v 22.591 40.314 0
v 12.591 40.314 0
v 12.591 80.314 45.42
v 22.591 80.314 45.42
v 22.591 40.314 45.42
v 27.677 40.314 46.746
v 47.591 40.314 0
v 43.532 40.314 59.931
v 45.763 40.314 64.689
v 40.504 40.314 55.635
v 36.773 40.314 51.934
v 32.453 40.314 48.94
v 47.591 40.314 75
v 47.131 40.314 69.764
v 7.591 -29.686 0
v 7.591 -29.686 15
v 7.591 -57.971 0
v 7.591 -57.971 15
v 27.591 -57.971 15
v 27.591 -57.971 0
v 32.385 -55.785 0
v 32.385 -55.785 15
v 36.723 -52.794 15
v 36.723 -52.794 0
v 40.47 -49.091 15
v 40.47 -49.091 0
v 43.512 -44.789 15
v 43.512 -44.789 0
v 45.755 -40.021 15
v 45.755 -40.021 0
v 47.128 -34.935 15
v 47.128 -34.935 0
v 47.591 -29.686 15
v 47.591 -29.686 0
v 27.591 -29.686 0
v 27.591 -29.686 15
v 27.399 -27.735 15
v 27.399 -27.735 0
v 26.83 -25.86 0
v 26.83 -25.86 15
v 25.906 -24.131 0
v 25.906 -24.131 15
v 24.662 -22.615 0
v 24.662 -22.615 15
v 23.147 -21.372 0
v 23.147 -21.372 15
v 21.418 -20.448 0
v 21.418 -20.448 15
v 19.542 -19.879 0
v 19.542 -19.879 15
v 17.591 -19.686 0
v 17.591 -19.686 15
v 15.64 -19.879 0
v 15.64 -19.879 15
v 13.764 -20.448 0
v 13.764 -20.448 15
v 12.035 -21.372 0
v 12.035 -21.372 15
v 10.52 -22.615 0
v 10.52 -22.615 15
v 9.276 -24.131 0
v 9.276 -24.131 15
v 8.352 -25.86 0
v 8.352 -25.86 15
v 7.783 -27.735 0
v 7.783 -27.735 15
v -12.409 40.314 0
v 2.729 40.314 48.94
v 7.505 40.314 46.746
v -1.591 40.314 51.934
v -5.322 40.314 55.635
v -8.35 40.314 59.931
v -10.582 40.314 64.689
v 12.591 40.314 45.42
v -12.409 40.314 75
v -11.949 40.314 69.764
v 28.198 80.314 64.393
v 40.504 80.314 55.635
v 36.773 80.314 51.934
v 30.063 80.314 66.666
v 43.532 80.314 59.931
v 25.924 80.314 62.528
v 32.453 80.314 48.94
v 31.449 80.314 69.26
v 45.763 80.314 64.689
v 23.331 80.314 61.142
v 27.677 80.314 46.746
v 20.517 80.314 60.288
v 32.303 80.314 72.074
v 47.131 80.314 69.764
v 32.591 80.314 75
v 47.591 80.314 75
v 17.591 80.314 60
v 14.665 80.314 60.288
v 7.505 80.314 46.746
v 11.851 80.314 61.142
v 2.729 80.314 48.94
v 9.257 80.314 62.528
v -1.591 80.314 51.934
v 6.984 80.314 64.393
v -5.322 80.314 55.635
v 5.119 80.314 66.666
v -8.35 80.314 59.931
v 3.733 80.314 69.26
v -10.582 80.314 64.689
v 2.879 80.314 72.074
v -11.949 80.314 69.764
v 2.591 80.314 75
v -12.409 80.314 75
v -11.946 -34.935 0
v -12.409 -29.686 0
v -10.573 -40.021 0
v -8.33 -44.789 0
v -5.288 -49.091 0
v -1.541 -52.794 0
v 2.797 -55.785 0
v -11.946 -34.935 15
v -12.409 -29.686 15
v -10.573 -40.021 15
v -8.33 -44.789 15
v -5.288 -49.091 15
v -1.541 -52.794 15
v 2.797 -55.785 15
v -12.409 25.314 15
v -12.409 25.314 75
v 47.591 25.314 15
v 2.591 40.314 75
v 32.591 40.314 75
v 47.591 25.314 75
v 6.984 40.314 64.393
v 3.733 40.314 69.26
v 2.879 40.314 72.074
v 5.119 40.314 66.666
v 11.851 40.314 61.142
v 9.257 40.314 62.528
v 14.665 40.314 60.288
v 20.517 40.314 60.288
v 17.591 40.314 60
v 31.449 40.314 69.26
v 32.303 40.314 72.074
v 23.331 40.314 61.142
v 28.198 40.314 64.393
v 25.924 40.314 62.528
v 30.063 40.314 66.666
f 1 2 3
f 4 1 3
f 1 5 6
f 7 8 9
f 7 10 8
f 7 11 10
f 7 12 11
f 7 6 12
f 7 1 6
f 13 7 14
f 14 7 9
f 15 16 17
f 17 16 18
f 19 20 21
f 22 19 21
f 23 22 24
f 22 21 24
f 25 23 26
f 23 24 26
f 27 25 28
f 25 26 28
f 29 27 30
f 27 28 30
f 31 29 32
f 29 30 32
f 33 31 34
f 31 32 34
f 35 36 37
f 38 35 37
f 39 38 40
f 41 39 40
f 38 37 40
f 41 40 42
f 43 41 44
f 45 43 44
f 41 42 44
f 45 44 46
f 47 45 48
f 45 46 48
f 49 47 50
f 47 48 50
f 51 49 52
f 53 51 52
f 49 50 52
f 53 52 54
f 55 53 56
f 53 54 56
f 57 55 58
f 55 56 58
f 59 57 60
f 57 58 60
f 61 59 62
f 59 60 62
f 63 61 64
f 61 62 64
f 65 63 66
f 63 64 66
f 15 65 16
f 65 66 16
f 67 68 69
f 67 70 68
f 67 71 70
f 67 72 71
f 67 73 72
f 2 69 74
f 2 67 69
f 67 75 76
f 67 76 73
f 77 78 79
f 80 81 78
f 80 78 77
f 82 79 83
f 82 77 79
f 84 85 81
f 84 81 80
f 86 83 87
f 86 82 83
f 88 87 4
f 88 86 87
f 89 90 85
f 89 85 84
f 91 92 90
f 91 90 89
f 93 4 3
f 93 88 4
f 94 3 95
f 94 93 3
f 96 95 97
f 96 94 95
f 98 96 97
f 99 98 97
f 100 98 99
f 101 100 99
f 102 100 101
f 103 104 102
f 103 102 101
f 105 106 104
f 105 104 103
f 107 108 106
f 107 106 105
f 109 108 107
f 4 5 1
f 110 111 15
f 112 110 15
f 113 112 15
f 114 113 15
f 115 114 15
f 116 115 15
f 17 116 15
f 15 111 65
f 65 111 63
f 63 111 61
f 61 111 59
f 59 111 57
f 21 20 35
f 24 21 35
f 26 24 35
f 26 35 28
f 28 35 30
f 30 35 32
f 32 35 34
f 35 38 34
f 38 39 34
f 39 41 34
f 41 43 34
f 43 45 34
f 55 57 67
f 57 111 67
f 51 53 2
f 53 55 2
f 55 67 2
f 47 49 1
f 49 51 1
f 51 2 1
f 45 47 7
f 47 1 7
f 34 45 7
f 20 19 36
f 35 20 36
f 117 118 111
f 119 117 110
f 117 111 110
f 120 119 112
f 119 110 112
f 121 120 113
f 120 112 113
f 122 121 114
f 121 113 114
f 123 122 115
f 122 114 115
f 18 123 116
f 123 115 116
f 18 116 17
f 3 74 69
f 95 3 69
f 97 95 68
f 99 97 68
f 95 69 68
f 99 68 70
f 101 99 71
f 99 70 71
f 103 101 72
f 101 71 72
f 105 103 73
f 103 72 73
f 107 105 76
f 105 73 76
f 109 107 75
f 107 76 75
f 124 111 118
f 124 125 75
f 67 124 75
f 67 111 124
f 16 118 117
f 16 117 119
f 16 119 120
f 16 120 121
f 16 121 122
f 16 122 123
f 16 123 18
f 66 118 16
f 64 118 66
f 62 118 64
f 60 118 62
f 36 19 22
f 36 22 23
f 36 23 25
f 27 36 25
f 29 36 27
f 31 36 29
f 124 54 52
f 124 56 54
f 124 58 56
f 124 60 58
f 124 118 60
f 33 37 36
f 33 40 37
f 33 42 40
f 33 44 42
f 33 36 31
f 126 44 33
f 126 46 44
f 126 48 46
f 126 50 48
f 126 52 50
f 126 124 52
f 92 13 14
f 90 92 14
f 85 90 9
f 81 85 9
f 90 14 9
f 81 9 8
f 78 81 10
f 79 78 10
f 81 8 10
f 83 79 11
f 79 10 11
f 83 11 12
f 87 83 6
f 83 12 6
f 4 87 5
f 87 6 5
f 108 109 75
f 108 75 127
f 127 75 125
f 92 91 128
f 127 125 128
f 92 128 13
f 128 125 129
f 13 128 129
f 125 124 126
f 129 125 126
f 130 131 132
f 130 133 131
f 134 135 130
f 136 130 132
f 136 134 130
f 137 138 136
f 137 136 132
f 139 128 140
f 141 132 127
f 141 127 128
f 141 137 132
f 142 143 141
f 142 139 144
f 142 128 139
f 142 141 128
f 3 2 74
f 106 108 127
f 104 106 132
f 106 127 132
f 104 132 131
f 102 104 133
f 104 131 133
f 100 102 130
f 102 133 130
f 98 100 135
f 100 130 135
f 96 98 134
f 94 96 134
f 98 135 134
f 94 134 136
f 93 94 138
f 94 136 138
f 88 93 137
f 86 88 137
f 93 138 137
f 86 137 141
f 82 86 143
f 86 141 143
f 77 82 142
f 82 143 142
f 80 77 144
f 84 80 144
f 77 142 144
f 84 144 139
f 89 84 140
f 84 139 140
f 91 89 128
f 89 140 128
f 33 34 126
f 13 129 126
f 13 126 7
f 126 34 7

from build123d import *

# Parameters (mm, degrees)
F0_W      = 60
F0_H      = 15
F1_DEPTH  = 75
F2_DEPTH  = 15
F4_DEPTH  = 25
F6_DEPTH  = 40
F8_DEPTH  = 40
F10_DEPTH = 25


with BuildPart() as f1:
    # F0 (on Top) → F1 (new body)
    with BuildSketch(Plane.XY):
        with Locations((17.5909090042, 32.8136347234)):
            Rectangle(F0_W, F0_H)
    extrude(amount=F1_DEPTH)

    # F0 (on Top) → F2 (join)
    with BuildSketch(Plane.XY):
        with Locations((17.5909090042, 32.8136347234)):
            Rectangle(F0_W, F0_H)
        with BuildLine():
            Line((47.5909090042, 25.3136347234), (-12.4090909958, 25.3136347234))
            Line((-12.4090909958, 25.3136347234), (-12.4090909958, -29.6863652766))
            ThreePointArc((-12.4090909958, -29.6863652766), (17.5909090042, 0.3136347234), (47.5909090042, -29.6863652766))
            Line((47.5909090042, -29.6863652766), (47.5909090042, 25.3136347234))
        make_face()
        with BuildLine():
            ThreePointArc((47.5909090042, -29.6863652766), (17.5909090042, 0.3136347234), (-12.4090909958, -29.6863652766))
            Line((-12.4090909958, -29.6863652766), (47.5909090042, -29.6863652766))
        make_face()
        with BuildLine():
            Line((47.5909090042, -29.6863652766), (-12.4090909958, -29.6863652766))
            ThreePointArc((-12.4090909958, -29.6863652766), (17.5909090042, -59.6863652766), (47.5909090042, -29.6863652766))
        make_face()
    extrude(amount=F2_DEPTH)

    # F3 (on face) → F4 (cut)
    with BuildSketch(Plane.XY.offset(15)):
        with BuildLine():
            ThreePointArc((7.5909090042, -57.970636524), (17.5909090042, -59.6863652766), (27.5909090042, -57.970636524))
            Line((27.5909090042, -57.970636524), (27.5909090042, -29.6863652766))
            ThreePointArc((27.5909090042, -29.6863652766), (17.5909090042, -39.6863652766), (7.5909090042, -29.6863652766))
            Line((7.5909090042, -29.6863652766), (7.5909090042, -57.970636524))
        make_face()
        with BuildLine():
            ThreePointArc((7.5909090042, -29.6863652766), (17.5909090042, -39.6863652766), (27.5909090042, -29.6863652766))
            Line((27.5909090042, -29.6863652766), (17.5909090042, -29.6863652766))
            Line((17.5909090042, -29.6863652766), (7.5909090042, -29.6863652766))
        make_face()
        with BuildLine():
            Line((17.5909090042, -29.6863652766), (27.5909090042, -29.6863652766))
            ThreePointArc((27.5909090042, -29.6863652766), (17.5909090042, -19.6863652766), (7.5909090042, -29.6863652766))
            Line((7.5909090042, -29.6863652766), (17.5909090042, -29.6863652766))
        make_face()
    extrude(amount=-F4_DEPTH, mode=Mode.SUBTRACT)

    # F5 (on face) → F6 (join)
    with BuildSketch(Plane(origin=(0, 40.3136347234, 0), x_dir=(-1, 0, 0), z_dir=(0, 1, 0))):
        with BuildLine():
            Line((-42.2313958406, 75), (-47.5909090042, 75))
            ThreePointArc((-47.5909090042, 75), (-17.5909090042, 45), (12.4090909958, 75))
            Line((12.4090909958, 75), (-2.5909090042, 75))
            ThreePointArc((-2.5909090042, 75), (-17.5909090042, 60), (-32.5909090042, 75))
            Line((-32.5909090042, 75), (-42.2313958406, 75))
        make_face()
    extrude(amount=F6_DEPTH)

    # F7 (on face) → F8 (join)
    with BuildSketch(Plane(origin=(0, 40.3136347234, 0), x_dir=(-1, 0, 0), z_dir=(0, 1, 0))):
        with BuildLine():
            Line((-22.5909090042, 45.4196010845), (-22.5909090042, 0))
            Line((-22.5909090042, 0), (-12.5909090042, 0))
            Line((-12.5909090042, 0), (-12.5909090042, 45.4196010845))
            ThreePointArc((-12.5909090042, 45.4196010845), (-17.5909090042, 45), (-22.5909090042, 45.4196010845))
        make_face()
    extrude(amount=F8_DEPTH)

    # F9 (on face) → F10 (cut)
    with BuildSketch(Plane(origin=(12.5909090042, 0, 0), x_dir=(0, -1, 0), z_dir=(-1, 0, 0))):
        Polygon((-40.3136347234, 0), (-80.3136347234, 45.4196010845), (-80.3136347234, 0), align=None)
    extrude(amount=-F10_DEPTH, mode=Mode.SUBTRACT)


solid = f1.part
